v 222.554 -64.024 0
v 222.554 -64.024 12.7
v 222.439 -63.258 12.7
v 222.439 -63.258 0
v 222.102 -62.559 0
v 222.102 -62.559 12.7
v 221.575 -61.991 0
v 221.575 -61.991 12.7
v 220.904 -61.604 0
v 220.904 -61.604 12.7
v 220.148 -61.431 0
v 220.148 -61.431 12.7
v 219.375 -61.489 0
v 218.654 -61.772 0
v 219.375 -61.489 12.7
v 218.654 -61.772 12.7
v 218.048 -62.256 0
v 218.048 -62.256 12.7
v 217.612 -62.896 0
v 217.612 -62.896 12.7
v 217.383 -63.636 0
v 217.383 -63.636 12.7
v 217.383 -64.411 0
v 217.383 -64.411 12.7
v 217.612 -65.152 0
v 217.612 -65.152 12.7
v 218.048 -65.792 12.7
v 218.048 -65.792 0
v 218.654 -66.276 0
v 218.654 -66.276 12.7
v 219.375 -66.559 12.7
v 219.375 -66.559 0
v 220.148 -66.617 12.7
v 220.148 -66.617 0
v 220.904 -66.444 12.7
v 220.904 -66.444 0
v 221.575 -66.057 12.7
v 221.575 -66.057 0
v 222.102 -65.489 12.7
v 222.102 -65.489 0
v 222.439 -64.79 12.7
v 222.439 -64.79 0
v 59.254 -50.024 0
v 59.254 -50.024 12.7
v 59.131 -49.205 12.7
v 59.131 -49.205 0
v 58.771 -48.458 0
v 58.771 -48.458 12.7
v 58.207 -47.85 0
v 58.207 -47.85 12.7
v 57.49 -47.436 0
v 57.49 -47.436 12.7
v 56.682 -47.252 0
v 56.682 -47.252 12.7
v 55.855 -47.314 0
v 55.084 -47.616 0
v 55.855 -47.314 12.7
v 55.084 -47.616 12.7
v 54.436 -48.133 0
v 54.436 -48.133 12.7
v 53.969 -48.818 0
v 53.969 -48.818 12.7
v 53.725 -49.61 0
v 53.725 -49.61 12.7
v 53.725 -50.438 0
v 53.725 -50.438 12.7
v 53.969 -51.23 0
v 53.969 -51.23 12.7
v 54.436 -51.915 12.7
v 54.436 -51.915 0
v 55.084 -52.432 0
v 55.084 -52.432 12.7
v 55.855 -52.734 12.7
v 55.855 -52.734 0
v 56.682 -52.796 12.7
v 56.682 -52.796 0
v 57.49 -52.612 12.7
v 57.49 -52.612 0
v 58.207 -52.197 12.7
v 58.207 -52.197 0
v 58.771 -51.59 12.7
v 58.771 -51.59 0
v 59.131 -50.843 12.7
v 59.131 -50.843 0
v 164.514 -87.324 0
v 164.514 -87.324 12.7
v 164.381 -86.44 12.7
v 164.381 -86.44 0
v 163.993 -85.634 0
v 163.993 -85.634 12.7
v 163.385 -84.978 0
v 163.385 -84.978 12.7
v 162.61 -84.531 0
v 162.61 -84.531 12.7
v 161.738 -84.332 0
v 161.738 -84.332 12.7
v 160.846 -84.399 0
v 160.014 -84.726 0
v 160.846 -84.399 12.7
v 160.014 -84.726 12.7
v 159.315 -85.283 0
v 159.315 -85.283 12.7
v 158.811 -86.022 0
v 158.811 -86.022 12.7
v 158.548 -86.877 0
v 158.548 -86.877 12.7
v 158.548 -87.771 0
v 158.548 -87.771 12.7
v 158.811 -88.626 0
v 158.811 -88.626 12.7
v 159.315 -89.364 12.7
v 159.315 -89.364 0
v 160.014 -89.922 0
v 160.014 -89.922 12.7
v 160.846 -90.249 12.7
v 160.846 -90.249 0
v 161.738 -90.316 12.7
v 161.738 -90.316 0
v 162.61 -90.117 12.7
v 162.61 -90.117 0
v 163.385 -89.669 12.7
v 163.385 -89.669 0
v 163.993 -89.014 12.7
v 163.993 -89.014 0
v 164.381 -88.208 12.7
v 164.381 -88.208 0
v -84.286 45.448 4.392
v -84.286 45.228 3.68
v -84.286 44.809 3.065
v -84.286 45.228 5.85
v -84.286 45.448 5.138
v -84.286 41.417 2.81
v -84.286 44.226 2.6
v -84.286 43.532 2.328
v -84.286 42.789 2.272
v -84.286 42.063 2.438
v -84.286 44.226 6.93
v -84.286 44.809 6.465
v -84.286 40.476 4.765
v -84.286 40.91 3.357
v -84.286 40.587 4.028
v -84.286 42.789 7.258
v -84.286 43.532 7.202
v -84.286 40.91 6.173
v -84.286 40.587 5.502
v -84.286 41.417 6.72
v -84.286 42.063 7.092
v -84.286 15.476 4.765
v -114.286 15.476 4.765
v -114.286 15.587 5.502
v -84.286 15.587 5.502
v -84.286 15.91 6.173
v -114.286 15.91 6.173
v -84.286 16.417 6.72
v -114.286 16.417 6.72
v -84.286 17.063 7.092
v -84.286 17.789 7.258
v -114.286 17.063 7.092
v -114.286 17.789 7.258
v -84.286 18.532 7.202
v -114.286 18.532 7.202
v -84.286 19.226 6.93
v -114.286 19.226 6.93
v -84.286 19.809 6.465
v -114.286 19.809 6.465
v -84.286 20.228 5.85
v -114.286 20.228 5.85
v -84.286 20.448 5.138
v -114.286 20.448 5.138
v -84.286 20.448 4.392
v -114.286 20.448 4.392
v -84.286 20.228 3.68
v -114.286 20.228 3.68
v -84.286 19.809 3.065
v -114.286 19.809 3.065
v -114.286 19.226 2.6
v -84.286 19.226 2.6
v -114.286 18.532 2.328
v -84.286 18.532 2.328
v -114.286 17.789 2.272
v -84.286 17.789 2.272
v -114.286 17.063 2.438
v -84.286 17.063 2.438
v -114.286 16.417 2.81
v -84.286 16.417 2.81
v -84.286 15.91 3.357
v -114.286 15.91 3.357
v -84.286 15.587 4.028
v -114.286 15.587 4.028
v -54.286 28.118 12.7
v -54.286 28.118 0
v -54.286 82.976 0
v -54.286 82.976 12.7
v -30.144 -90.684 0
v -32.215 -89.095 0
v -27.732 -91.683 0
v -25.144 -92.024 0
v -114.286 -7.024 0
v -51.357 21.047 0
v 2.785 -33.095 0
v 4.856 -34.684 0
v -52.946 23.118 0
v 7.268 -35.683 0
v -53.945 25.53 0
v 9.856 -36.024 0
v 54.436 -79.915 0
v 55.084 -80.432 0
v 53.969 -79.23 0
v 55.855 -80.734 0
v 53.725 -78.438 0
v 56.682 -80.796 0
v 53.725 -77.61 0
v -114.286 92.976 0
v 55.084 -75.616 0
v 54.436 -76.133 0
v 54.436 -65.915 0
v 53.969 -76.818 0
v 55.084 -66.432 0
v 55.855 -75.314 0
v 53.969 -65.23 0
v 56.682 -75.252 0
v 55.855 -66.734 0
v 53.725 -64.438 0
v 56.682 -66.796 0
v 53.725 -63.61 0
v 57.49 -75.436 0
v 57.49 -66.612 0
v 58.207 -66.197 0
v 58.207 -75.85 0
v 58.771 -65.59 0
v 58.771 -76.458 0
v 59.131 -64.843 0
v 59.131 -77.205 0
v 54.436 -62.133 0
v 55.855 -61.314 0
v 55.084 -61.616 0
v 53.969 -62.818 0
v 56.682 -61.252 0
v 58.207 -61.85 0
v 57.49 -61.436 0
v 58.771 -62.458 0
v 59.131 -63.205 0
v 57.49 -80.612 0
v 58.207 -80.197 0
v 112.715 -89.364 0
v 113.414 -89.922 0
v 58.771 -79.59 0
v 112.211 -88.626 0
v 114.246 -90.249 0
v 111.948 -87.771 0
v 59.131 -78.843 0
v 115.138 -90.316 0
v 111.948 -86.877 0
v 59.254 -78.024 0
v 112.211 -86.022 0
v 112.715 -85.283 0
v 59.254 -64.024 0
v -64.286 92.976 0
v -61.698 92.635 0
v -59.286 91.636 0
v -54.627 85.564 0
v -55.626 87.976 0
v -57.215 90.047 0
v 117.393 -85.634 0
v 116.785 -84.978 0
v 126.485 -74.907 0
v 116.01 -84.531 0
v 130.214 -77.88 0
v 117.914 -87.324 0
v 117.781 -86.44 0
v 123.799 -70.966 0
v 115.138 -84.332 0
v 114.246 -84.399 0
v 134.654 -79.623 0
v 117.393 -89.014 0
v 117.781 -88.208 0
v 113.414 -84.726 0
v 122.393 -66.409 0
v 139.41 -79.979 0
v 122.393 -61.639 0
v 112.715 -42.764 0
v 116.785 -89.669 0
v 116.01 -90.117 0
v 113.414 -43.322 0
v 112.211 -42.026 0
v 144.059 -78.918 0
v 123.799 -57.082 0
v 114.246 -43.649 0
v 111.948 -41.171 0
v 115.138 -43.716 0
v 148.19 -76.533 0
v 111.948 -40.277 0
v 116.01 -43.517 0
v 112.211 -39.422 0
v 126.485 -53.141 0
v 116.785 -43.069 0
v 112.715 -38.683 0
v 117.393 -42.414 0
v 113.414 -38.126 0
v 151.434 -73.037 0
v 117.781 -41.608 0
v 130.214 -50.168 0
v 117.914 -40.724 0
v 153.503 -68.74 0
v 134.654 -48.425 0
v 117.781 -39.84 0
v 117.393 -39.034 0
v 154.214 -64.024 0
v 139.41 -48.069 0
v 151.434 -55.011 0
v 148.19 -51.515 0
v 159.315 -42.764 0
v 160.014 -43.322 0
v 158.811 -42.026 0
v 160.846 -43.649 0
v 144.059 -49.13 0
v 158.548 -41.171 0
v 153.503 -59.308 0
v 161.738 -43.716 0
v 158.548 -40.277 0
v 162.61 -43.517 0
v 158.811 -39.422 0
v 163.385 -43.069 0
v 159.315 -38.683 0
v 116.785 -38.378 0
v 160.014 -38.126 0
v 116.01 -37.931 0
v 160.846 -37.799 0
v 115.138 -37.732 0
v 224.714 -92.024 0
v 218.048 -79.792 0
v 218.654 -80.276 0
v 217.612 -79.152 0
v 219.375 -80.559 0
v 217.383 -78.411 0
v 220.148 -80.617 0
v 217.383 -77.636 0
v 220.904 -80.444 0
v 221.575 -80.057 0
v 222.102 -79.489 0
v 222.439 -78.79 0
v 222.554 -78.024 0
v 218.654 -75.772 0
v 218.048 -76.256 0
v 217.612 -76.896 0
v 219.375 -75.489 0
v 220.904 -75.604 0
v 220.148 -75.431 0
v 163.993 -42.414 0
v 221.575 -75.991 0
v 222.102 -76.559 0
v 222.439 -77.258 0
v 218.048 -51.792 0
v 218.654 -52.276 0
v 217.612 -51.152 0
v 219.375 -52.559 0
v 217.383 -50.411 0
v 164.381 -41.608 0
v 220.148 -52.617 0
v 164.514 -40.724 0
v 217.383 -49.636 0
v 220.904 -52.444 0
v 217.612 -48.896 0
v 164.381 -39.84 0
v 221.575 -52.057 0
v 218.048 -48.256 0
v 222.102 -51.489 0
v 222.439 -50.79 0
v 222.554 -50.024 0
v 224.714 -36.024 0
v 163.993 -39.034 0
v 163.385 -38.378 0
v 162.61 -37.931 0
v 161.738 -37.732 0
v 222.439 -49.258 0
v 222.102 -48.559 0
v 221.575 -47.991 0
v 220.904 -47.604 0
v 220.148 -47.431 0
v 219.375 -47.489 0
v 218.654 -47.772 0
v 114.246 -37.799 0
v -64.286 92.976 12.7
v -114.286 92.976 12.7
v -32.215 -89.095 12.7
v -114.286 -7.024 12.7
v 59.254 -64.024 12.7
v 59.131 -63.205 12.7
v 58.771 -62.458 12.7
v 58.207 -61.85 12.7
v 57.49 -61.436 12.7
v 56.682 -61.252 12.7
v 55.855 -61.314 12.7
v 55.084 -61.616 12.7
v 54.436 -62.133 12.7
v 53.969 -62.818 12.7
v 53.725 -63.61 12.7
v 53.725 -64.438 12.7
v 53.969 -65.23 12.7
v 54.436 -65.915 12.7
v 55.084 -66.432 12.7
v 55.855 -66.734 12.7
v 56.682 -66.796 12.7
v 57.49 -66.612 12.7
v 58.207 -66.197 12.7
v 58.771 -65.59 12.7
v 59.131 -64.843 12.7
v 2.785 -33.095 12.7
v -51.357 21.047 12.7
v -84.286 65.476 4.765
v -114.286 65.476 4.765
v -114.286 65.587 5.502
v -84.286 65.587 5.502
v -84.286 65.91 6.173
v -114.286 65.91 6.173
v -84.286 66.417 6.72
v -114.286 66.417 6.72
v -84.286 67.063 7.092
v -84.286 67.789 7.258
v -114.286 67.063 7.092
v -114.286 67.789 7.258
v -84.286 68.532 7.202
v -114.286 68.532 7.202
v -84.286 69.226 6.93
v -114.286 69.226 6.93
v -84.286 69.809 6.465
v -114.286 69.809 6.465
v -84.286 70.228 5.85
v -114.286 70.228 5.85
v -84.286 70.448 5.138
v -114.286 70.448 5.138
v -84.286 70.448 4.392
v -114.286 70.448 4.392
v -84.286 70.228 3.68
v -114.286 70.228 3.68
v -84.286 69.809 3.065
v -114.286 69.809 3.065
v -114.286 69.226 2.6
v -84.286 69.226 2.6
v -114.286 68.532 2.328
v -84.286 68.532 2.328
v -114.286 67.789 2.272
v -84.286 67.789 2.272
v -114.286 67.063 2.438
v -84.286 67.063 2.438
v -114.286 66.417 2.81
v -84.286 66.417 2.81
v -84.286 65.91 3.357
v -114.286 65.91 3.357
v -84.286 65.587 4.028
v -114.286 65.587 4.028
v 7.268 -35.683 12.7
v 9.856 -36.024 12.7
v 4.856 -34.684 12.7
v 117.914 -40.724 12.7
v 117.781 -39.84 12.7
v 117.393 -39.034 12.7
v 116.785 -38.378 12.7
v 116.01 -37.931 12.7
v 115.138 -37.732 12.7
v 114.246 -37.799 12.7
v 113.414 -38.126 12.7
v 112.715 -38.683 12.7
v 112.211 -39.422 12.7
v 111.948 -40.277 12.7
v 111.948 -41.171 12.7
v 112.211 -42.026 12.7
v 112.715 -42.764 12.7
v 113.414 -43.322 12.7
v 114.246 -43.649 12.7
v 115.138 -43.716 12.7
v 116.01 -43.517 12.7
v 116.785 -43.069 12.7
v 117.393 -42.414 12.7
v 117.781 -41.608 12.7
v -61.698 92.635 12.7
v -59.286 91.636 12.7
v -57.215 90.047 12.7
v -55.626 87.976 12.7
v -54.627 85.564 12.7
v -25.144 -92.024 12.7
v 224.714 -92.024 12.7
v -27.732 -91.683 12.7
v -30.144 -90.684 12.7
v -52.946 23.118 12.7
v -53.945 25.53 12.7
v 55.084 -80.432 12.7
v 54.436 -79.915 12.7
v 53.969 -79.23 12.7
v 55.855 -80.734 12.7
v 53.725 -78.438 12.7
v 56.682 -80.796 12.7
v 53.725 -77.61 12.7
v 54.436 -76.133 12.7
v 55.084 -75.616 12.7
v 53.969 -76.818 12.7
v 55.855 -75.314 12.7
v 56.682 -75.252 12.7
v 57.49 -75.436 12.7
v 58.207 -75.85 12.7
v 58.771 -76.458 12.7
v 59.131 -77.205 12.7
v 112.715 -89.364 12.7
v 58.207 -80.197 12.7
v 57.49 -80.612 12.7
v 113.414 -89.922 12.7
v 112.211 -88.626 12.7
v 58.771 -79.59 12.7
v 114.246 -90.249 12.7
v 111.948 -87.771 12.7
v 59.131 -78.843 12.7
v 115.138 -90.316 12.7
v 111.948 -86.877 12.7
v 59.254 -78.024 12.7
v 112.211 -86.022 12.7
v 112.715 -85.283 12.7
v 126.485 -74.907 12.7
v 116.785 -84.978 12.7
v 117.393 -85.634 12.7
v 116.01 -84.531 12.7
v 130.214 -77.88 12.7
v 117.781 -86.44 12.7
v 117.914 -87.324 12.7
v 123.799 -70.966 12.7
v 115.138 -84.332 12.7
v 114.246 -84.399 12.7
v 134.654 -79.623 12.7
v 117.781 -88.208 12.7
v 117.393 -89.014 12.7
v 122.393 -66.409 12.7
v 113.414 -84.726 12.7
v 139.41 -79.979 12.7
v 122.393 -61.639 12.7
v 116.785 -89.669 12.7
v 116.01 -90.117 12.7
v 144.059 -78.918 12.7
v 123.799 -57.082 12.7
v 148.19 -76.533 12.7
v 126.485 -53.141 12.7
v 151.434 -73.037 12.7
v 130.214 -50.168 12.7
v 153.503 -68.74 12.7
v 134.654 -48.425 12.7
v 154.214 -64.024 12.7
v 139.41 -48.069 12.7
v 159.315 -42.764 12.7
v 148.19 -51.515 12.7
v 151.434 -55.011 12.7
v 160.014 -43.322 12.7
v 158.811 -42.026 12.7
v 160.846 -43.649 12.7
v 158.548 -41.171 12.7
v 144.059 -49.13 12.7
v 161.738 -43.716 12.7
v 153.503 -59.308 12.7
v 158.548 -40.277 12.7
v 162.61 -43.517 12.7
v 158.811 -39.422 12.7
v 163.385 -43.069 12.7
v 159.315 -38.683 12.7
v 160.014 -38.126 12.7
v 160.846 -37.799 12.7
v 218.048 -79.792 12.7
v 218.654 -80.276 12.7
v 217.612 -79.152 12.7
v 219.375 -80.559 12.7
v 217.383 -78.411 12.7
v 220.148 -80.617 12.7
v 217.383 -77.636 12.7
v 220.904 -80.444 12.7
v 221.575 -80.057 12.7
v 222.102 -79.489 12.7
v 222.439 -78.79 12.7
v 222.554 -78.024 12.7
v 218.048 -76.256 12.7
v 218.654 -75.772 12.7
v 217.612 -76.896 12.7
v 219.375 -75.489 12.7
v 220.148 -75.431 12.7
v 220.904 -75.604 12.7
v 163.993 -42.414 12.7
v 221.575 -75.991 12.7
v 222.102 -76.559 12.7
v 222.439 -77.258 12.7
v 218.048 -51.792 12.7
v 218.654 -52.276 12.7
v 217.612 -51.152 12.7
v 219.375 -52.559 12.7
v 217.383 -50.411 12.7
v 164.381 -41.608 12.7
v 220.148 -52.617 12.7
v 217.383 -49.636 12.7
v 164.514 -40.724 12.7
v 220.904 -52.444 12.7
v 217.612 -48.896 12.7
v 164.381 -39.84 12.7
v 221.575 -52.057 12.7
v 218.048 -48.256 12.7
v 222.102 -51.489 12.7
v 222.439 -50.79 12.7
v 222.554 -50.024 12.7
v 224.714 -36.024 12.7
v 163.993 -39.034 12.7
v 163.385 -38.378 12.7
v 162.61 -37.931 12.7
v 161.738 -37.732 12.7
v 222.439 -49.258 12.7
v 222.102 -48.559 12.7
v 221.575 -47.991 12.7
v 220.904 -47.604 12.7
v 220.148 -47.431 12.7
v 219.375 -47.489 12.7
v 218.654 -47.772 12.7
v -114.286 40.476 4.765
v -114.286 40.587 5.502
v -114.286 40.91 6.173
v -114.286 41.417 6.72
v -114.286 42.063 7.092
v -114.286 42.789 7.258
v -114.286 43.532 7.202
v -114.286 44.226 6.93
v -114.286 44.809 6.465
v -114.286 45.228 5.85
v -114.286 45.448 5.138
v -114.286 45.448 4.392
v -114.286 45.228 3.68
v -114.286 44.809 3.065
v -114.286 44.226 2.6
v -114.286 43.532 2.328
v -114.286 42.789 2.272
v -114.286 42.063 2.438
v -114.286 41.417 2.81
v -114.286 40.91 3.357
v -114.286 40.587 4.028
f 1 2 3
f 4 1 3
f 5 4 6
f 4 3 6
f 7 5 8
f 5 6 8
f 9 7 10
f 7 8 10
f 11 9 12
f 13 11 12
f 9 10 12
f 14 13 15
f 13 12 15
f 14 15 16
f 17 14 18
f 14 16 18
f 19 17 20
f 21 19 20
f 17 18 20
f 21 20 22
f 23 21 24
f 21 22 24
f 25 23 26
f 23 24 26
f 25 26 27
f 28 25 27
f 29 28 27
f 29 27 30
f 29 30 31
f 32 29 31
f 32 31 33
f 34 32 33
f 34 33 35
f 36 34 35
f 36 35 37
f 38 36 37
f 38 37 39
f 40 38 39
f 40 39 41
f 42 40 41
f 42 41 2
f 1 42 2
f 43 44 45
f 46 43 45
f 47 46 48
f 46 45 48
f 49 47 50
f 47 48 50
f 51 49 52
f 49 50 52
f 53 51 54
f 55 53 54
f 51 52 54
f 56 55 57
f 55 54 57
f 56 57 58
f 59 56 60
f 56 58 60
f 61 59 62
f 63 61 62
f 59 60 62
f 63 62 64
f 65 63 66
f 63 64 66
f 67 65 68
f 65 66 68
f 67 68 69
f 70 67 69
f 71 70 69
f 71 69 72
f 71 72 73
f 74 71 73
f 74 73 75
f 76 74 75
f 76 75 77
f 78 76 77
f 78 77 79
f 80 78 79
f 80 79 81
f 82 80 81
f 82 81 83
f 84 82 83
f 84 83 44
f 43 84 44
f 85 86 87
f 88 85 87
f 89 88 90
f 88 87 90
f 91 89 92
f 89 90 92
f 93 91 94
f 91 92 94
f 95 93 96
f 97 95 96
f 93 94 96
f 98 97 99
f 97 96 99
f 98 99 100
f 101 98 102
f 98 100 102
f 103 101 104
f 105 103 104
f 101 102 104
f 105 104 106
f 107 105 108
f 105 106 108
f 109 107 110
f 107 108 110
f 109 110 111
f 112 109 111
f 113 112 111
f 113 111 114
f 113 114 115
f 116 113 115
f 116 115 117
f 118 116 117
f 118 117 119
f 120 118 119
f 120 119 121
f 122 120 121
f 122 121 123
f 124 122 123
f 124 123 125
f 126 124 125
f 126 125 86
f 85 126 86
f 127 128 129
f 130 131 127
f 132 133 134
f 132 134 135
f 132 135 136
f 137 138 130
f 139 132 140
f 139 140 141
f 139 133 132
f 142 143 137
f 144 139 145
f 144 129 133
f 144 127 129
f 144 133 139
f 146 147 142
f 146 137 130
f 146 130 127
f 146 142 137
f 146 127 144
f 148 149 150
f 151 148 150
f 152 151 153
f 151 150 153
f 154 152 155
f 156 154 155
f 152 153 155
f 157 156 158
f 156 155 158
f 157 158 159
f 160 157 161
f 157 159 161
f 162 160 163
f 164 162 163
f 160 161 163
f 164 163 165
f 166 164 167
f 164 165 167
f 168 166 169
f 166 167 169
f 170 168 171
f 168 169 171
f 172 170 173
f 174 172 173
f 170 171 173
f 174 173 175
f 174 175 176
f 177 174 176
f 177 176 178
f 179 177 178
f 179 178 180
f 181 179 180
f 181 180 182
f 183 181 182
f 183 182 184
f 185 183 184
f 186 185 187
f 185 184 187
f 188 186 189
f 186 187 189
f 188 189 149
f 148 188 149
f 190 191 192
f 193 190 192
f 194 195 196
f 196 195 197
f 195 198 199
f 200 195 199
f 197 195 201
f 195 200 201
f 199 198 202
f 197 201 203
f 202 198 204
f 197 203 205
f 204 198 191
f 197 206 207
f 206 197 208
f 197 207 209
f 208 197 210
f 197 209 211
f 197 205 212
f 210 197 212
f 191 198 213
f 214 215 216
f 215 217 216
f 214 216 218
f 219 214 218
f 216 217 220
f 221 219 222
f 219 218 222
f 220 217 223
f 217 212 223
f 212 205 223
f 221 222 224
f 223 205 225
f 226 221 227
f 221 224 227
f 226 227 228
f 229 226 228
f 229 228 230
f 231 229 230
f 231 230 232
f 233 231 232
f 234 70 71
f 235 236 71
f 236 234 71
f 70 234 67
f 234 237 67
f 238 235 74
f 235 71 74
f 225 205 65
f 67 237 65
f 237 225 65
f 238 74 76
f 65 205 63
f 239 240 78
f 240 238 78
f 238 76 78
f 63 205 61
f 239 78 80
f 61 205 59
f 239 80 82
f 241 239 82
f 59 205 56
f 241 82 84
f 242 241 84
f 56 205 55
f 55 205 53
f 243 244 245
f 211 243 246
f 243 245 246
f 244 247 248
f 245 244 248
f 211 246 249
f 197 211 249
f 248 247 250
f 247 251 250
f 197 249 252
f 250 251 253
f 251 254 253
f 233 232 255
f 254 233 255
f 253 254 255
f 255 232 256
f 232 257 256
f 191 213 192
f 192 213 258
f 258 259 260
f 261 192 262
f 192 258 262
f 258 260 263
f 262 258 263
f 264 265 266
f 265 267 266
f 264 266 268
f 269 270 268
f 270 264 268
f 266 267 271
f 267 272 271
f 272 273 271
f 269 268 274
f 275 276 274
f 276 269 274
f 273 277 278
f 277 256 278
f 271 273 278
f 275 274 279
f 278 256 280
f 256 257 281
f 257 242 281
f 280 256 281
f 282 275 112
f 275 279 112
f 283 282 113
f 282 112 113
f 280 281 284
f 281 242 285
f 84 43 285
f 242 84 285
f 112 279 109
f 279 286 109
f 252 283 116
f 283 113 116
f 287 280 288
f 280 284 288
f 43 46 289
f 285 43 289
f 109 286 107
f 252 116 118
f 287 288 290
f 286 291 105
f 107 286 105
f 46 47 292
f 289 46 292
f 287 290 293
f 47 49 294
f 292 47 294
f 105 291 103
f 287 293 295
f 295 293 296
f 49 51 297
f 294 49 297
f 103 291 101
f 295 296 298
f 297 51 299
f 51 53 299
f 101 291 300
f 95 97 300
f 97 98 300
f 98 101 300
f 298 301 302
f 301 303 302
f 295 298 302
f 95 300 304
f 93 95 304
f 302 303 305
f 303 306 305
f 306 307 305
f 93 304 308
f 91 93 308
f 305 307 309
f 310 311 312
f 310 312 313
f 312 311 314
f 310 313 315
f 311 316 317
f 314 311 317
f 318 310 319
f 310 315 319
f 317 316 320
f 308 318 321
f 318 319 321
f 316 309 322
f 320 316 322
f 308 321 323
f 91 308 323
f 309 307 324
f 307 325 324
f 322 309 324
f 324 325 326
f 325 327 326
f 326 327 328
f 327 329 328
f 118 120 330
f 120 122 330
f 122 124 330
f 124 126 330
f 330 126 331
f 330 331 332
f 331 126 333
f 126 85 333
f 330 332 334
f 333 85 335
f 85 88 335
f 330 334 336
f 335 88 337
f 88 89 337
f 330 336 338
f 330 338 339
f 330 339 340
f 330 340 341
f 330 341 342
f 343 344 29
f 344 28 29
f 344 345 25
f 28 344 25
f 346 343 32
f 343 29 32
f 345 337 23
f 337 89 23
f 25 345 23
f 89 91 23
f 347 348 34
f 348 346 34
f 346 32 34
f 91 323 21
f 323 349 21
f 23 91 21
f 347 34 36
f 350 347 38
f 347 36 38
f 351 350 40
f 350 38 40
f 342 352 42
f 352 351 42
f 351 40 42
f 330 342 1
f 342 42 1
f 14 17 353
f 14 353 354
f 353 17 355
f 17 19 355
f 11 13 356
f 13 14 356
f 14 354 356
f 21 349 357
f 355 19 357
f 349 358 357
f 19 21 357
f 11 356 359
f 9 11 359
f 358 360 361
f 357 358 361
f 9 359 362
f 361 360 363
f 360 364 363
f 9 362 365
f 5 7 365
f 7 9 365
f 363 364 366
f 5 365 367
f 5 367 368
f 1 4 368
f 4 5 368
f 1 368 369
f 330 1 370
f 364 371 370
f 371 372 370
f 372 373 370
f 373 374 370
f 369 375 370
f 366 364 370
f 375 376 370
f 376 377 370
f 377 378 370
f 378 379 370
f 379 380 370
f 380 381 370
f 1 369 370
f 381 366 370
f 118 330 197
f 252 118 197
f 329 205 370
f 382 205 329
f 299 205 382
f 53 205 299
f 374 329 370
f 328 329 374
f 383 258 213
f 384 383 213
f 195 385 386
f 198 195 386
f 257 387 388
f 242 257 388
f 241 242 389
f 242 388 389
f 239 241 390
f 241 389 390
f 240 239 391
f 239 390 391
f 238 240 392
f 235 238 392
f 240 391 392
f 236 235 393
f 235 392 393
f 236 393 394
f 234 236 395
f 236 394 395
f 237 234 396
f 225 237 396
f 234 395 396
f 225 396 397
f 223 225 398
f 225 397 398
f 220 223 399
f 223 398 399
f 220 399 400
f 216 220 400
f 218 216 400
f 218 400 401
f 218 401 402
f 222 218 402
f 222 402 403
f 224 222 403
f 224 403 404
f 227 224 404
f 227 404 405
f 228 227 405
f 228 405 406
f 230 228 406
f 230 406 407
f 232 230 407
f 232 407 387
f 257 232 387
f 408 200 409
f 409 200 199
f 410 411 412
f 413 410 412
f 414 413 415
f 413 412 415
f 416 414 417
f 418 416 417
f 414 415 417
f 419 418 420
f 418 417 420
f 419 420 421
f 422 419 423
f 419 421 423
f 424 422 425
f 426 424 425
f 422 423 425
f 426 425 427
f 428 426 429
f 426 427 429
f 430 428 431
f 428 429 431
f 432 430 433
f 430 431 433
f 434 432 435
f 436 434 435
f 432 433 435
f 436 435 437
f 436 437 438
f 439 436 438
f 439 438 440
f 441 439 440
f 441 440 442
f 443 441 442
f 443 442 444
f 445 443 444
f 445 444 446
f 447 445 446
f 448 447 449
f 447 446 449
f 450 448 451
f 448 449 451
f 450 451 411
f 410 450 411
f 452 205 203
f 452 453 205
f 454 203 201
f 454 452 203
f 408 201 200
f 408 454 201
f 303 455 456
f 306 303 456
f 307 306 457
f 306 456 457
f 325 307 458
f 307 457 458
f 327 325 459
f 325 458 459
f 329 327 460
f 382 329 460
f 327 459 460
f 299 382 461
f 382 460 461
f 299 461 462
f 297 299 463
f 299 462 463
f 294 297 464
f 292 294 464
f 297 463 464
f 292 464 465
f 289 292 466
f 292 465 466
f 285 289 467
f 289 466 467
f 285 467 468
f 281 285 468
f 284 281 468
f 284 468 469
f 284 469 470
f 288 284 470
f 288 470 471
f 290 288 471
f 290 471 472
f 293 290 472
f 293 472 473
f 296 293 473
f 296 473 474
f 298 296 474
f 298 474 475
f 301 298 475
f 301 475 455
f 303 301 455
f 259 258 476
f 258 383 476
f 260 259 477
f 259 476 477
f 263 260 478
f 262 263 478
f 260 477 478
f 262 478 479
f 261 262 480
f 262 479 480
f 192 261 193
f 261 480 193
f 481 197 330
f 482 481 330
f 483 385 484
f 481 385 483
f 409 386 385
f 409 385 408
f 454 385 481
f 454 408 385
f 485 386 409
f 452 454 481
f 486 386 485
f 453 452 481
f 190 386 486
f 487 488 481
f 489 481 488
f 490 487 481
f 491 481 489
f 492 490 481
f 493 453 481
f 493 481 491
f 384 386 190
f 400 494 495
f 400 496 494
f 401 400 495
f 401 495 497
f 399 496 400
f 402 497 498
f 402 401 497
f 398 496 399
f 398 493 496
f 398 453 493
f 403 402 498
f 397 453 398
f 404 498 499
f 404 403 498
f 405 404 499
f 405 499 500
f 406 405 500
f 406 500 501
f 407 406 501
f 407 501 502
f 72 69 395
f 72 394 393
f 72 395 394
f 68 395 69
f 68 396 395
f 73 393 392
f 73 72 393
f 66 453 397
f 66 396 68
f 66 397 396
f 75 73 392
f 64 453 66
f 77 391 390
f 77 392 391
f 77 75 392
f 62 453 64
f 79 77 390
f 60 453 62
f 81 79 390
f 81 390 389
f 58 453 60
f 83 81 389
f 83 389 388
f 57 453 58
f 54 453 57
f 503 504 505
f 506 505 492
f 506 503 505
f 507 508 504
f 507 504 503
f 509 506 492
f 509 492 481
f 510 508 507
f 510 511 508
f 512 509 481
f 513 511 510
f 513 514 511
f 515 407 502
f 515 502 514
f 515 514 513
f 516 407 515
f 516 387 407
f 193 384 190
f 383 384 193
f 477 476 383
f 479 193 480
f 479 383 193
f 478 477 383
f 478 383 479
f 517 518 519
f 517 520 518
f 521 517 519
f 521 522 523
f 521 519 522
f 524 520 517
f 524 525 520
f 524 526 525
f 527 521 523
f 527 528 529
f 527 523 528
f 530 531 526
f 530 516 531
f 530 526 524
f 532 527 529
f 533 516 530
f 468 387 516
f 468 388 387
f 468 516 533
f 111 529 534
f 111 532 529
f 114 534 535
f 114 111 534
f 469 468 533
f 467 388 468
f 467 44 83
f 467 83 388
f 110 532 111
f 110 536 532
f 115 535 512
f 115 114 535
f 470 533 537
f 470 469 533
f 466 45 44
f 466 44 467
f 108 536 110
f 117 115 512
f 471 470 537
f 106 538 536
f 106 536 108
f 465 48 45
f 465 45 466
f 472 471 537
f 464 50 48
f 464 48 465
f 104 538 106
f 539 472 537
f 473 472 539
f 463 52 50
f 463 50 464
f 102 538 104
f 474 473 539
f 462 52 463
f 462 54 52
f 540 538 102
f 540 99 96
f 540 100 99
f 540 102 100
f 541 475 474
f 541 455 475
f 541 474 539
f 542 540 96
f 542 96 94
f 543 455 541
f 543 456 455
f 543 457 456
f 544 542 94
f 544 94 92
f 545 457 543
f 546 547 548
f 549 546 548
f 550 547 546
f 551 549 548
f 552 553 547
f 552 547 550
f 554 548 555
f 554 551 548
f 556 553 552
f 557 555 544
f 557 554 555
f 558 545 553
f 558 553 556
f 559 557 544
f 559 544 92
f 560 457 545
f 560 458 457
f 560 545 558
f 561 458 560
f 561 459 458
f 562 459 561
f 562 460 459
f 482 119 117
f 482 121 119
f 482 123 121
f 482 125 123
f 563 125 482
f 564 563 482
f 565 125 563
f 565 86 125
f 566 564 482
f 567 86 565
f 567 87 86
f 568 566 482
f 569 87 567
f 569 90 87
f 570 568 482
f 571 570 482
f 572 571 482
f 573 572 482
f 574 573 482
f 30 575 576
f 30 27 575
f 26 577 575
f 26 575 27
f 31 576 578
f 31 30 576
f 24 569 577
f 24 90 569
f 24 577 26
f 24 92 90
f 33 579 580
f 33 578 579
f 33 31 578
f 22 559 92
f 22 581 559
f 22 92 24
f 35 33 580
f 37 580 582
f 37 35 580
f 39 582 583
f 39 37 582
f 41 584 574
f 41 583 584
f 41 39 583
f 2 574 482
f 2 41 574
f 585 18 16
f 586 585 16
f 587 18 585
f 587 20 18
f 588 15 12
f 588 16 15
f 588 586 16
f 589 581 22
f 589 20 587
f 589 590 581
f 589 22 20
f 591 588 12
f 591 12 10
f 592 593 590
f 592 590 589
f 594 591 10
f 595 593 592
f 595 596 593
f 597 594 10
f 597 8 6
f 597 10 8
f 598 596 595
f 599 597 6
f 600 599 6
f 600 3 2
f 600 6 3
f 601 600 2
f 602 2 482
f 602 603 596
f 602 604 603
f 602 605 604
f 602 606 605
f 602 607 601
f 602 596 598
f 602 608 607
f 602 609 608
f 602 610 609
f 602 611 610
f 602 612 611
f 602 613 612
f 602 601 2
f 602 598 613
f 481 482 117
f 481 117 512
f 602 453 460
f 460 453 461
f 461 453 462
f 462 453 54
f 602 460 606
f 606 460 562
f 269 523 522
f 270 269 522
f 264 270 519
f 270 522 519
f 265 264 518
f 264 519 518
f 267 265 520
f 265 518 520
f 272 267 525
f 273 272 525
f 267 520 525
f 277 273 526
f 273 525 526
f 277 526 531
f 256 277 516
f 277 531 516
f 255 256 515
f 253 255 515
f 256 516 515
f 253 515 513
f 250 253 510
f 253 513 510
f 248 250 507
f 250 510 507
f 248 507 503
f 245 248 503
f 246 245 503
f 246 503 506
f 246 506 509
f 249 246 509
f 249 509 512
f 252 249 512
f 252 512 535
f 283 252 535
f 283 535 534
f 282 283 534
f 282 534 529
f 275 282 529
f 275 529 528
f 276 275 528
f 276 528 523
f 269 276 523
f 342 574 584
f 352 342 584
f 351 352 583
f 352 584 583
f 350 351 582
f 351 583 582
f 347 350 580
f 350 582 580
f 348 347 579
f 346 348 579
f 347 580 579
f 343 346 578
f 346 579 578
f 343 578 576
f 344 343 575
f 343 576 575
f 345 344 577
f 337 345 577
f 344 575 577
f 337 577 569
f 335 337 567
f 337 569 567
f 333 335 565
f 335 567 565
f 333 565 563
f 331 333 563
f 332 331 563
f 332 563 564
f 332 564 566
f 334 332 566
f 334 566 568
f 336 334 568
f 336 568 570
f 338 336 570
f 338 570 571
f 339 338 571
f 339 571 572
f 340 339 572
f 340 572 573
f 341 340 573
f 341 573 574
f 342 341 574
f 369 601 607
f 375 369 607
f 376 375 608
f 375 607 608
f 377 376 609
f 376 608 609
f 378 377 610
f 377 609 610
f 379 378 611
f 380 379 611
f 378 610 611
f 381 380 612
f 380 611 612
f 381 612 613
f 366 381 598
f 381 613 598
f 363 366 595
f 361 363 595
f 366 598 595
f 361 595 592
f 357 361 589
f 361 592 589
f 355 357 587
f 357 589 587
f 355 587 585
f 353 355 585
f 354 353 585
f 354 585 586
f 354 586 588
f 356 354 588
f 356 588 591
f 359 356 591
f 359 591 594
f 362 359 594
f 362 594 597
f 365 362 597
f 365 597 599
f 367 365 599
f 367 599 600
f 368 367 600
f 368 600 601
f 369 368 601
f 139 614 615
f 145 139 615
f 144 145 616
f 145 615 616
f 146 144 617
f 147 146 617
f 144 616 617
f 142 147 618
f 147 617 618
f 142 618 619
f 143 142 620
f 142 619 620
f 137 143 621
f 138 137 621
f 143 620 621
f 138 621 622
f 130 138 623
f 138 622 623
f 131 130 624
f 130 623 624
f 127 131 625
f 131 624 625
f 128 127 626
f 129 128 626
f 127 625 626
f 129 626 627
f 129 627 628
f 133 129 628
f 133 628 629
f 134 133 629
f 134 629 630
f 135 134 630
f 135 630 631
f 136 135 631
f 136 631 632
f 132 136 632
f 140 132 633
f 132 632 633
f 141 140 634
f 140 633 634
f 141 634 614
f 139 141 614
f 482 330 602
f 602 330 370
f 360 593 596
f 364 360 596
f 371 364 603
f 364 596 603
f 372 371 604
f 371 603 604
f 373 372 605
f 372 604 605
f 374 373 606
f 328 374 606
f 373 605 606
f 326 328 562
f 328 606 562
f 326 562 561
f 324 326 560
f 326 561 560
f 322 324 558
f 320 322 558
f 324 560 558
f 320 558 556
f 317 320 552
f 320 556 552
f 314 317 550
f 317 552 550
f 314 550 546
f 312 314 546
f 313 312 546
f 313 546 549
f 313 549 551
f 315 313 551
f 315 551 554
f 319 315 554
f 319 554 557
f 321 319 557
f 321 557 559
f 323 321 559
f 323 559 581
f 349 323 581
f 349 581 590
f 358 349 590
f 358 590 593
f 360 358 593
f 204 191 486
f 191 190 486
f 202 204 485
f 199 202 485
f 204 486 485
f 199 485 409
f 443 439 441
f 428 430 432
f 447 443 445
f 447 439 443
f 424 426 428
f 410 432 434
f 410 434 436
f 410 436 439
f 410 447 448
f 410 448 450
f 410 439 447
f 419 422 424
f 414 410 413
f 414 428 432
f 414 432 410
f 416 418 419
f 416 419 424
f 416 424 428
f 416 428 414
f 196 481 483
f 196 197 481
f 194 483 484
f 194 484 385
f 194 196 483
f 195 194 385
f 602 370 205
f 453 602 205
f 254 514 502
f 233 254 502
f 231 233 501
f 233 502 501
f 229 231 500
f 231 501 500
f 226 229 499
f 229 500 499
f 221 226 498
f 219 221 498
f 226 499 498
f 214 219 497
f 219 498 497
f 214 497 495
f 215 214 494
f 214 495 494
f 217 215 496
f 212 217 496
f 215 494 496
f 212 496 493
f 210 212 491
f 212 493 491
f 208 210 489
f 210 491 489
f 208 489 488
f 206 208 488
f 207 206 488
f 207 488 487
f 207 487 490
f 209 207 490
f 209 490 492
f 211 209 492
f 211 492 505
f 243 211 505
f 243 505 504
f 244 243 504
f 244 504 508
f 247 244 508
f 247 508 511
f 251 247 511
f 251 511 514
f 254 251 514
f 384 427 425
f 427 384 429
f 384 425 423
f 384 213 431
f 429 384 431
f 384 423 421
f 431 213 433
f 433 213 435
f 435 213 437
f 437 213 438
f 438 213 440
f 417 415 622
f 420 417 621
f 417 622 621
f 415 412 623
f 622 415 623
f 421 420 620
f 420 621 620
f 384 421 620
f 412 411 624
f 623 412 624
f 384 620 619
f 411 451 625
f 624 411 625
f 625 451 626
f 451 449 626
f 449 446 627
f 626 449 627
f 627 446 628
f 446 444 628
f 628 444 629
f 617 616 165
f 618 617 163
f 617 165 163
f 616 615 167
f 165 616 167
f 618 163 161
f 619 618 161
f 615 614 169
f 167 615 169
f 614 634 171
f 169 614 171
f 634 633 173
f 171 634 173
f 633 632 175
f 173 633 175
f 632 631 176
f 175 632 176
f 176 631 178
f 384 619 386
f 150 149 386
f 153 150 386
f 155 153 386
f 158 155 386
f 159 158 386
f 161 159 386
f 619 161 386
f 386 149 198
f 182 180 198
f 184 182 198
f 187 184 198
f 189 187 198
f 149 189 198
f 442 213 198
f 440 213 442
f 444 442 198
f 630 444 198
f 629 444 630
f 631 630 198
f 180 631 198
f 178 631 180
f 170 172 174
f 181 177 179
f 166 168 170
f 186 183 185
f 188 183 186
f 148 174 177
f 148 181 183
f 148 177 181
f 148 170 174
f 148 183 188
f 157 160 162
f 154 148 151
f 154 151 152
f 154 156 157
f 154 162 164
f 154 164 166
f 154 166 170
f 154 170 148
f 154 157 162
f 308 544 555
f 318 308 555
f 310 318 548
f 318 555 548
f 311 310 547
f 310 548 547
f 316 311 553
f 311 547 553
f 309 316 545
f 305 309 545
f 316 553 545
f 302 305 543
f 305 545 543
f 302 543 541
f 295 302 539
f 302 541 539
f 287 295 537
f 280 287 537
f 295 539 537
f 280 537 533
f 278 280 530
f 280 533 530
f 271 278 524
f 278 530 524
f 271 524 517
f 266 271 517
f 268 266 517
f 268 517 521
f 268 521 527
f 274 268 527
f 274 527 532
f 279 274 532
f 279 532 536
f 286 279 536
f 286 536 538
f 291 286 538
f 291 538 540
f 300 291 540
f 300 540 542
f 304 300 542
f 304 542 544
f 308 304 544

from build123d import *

# Parameters (mm, degrees)
RESSALTO_EXTRUS_O1_DEPTH   = 12.7
CIRCULO_DE_ROLAMENTO_REACH = 245.52
ESBO_O3_R                  = 16
CORTE_EXTRUS_O3_REACH      = 245.52
ESBO_O5_R                  = 3
ESBO_O6_R                  = 2.5
CORTE_EXTRUS_O4_DEPTH      = 30
CORTE_EXTRUS_O6_REACH      = 245.52
CORTE_EXTRUS_O7_REACH      = 245.52
ESBO_O10_R                 = 2.78
CORTE_EXTRUS_O8_REACH      = 245.52
ESBO_O12_R                 = 2.6
FILETE1_R                  = 10


with BuildPart() as part:
    # Esboço1 → Ressalto-extrusão1 (new body)
    with BuildSketch(Plane.XY):
        Polygon((-114.28595772, -92.023971813), (224.71404228, -92.023971813), (224.71404228, -36.023971813), (5.71404228, -36.023971813), (-54.28595772, 23.976028187), (-54.28595772, 92.976028187), (-114.28595772, 92.976028187), align=None)
    extrude(amount=RESSALTO_EXTRUS_O1_DEPTH)

    # Esboço3 → circulo de rolamento (cut, up to next)
    with BuildSketch(Plane.XY.offset(12.7), mode=Mode.PRIVATE) as circulo_de_rolamento_sk1:
        with Locations((138.21404228, -64.023971813)):
            Circle(ESBO_O3_R)
    circulo_de_rolamento_tool1 = extrude(circulo_de_rolamento_sk1.sketch, amount=-CIRCULO_DE_ROLAMENTO_REACH, mode=Mode.PRIVATE) & part.part
    add(circulo_de_rolamento_tool1.solids().sort_by_distance((138.214042, -64.023972, 12.7))[0], mode=Mode.SUBTRACT)

    # Esboço5 → Corte-extrusão3 (cut, up to next)
    with BuildSketch(Plane.XY.offset(12.7), mode=Mode.PRIVATE) as corte_extrus_o3_sk1:
        with Locations((114.91404228, -40.723971813)):
            Circle(ESBO_O5_R)
    corte_extrus_o3_tool1 = extrude(corte_extrus_o3_sk1.sketch, amount=-CORTE_EXTRUS_O3_REACH, mode=Mode.PRIVATE) & part.part
    # Esboço5 → Corte-extrusão3 (cut, up to next)
    with BuildSketch(Plane.XY.offset(12.7), mode=Mode.PRIVATE) as corte_extrus_o3_sk2:
        with Locations((161.51404228, -40.723971813)):
            Circle(ESBO_O5_R)
    corte_extrus_o3_tool2 = extrude(corte_extrus_o3_sk2.sketch, amount=-CORTE_EXTRUS_O3_REACH, mode=Mode.PRIVATE) & part.part
    # Esboço5 → Corte-extrusão3 (cut, up to next)
    with BuildSketch(Plane.XY.offset(12.7), mode=Mode.PRIVATE) as corte_extrus_o3_sk3:
        with Locations((161.51404228, -87.323971813)):
            Circle(ESBO_O5_R)
    corte_extrus_o3_tool3 = extrude(corte_extrus_o3_sk3.sketch, amount=-CORTE_EXTRUS_O3_REACH, mode=Mode.PRIVATE) & part.part
    # Esboço5 → Corte-extrusão3 (cut, up to next)
    with BuildSketch(Plane.XY.offset(12.7), mode=Mode.PRIVATE) as corte_extrus_o3_sk4:
        with Locations((114.91404228, -87.323971813)):
            Circle(ESBO_O5_R)
    corte_extrus_o3_tool4 = extrude(corte_extrus_o3_sk4.sketch, amount=-CORTE_EXTRUS_O3_REACH, mode=Mode.PRIVATE) & part.part
    add(corte_extrus_o3_tool1.solids().sort_by_distance((114.914042, -40.723972, 12.7))[0], mode=Mode.SUBTRACT)
    add(corte_extrus_o3_tool2.solids().sort_by_distance((161.514042, -40.723972, 12.7))[0], mode=Mode.SUBTRACT)
    add(corte_extrus_o3_tool3.solids().sort_by_distance((161.514042, -87.323972, 12.7))[0], mode=Mode.SUBTRACT)
    add(corte_extrus_o3_tool4.solids().sort_by_distance((114.914042, -87.323972, 12.7))[0], mode=Mode.SUBTRACT)

    # Esboço6 → Corte-extrusão4 (cut)
    with BuildSketch(Plane.ZY.offset(114.28595772)):
        with Locations(Location((4.765, 67.976028187, 0), (0, 0, 270))):
            Circle(ESBO_O6_R)
        with Locations(Location((4.765, 42.976028187, 0), (0, 0, 270))):
            Circle(ESBO_O6_R)
        with Locations(Location((4.765, 17.976028187, 0), (0, 0, 270))):
            Circle(ESBO_O6_R)
    extrude(amount=-CORTE_EXTRUS_O4_DEPTH, mode=Mode.SUBTRACT)

    # Esboço9 → Corte-extrusão6 (cut, up to next)
    with BuildSketch(Plane.XY.offset(12.7), mode=Mode.PRIVATE) as corte_extrus_o6_sk1:
        Polygon((-29.28595772, -92.023971813), (-114.28595772, -7.023971813), (-114.28595772, -92.023971813), align=None)
    corte_extrus_o6_tool1 = extrude(corte_extrus_o6_sk1.sketch, amount=-CORTE_EXTRUS_O6_REACH, mode=Mode.PRIVATE) & part.part
    add(corte_extrus_o6_tool1.solids().sort_by_distance((-85.952624, -63.690638, 12.7))[0], mode=Mode.SUBTRACT)

    # Esboço10 → Corte-extrusão7 (cut, up to next)
    with BuildSketch(Plane.XY.offset(12.7), mode=Mode.PRIVATE) as corte_extrus_o7_sk1:
        with Locations((56.47404228, -50.023971813)):
            Circle(ESBO_O10_R)
    corte_extrus_o7_tool1 = extrude(corte_extrus_o7_sk1.sketch, amount=-CORTE_EXTRUS_O7_REACH, mode=Mode.PRIVATE) & part.part
    # Esboço10 → Corte-extrusão7 (cut, up to next)
    with BuildSketch(Plane.XY.offset(12.7), mode=Mode.PRIVATE) as corte_extrus_o7_sk2:
        with Locations((56.47404228, -64.023971813)):
            Circle(ESBO_O10_R)
    corte_extrus_o7_tool2 = extrude(corte_extrus_o7_sk2.sketch, amount=-CORTE_EXTRUS_O7_REACH, mode=Mode.PRIVATE) & part.part
    # Esboço10 → Corte-extrusão7 (cut, up to next)
    with BuildSketch(Plane.XY.offset(12.7), mode=Mode.PRIVATE) as corte_extrus_o7_sk3:
        with Locations((56.47404228, -78.023971813)):
            Circle(ESBO_O10_R)
    corte_extrus_o7_tool3 = extrude(corte_extrus_o7_sk3.sketch, amount=-CORTE_EXTRUS_O7_REACH, mode=Mode.PRIVATE) & part.part
    add(corte_extrus_o7_tool1.solids().sort_by_distance((56.474042, -50.023972, 12.7))[0], mode=Mode.SUBTRACT)
    add(corte_extrus_o7_tool2.solids().sort_by_distance((56.474042, -64.023972, 12.7))[0], mode=Mode.SUBTRACT)
    add(corte_extrus_o7_tool3.solids().sort_by_distance((56.474042, -78.023972, 12.7))[0], mode=Mode.SUBTRACT)

    # Esboço12 → Corte-extrusão8 (cut, up to next)
    with BuildSketch(Plane.XY.offset(12.7), mode=Mode.PRIVATE) as corte_extrus_o8_sk1:
        with Locations((219.95404228, -50.023971813)):
            Circle(ESBO_O12_R)
    corte_extrus_o8_tool1 = extrude(corte_extrus_o8_sk1.sketch, amount=-CORTE_EXTRUS_O8_REACH, mode=Mode.PRIVATE) & part.part
    # Esboço12 → Corte-extrusão8 (cut, up to next)
    with BuildSketch(Plane.XY.offset(12.7), mode=Mode.PRIVATE) as corte_extrus_o8_sk2:
        with Locations((219.95404228, -64.023971813)):
            Circle(ESBO_O12_R)
    corte_extrus_o8_tool2 = extrude(corte_extrus_o8_sk2.sketch, amount=-CORTE_EXTRUS_O8_REACH, mode=Mode.PRIVATE) & part.part
    # Esboço12 → Corte-extrusão8 (cut, up to next)
    with BuildSketch(Plane.XY.offset(12.7), mode=Mode.PRIVATE) as corte_extrus_o8_sk3:
        with Locations((219.95404228, -78.023971813)):
            Circle(ESBO_O12_R)
    corte_extrus_o8_tool3 = extrude(corte_extrus_o8_sk3.sketch, amount=-CORTE_EXTRUS_O8_REACH, mode=Mode.PRIVATE) & part.part
    add(corte_extrus_o8_tool1.solids().sort_by_distance((219.954042, -50.023972, 12.7))[0], mode=Mode.SUBTRACT)
    add(corte_extrus_o8_tool2.solids().sort_by_distance((219.954042, -64.023972, 12.7))[0], mode=Mode.SUBTRACT)
    add(corte_extrus_o8_tool3.solids().sort_by_distance((219.954042, -78.023972, 12.7))[0], mode=Mode.SUBTRACT)

    # Filete1
    filete1_edges = [part.edges().sort_by_distance(p)[0] for p in [
        (-54.28595772, 92.976028187, 6.35),
        (-54.28595772, 23.976028187, 6.35),
        (5.71404228, -36.023971813, 6.35),
        (-29.28595772, -92.023971813, 6.35),
    ]]
    fillet(filete1_edges, radius=FILETE1_R)


solid = part.part
